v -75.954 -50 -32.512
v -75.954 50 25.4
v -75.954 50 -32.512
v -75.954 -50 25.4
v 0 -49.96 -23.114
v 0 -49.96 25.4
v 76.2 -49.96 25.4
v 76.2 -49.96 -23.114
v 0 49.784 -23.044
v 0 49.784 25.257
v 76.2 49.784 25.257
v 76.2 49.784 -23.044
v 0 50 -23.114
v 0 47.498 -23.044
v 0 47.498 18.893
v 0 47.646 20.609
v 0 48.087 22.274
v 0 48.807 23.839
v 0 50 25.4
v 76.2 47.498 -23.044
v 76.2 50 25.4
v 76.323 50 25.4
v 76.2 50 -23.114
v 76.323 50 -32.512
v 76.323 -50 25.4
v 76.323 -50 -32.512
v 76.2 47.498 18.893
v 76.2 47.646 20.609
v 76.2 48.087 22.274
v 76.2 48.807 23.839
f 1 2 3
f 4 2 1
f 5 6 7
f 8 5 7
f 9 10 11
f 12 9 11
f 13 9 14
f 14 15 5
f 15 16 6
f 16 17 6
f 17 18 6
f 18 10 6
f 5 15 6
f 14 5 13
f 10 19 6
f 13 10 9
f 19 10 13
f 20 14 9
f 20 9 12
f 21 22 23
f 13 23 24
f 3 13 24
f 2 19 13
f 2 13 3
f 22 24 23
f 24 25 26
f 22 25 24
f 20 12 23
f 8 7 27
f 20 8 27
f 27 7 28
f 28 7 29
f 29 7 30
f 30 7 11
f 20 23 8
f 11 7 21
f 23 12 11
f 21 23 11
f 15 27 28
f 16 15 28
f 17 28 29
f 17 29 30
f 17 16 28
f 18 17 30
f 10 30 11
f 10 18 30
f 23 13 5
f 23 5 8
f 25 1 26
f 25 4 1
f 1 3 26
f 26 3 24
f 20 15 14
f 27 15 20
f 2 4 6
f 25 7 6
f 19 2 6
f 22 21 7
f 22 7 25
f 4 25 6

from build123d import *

# Parameters (mm, degrees)
F1_DEPTH      = 25.4
F1_DEPTH_BACK = 32.512
F3_DEPTH      = 39.37
F3_DEPTH_BACK = 23.114
F6_START      = -47.498
F5_W          = 76.2000009418
F5_H          = 48.3009684831
F6_DEPTH      = 2.286
F7_T1_DEPTH   = 76.1999934912


# Not quite as in the source:
# - a fillet or chamfer that OpenCascade refuses, or shapes differently, is made with other operations: its cross-section is extruded or revolved along the edge and cut away or added


with BuildPart() as f1:
    # F0 (on Top) → F1 (new body, two sides)
    with BuildSketch(Plane.XY) as f1_sk:
        Polygon((0, 0), (0, -50), (76.3228982687, -50), (76.3228982687, 50), (0, 50), align=None)
        Polygon((-75.9541913867, -50), (0, -50), (0, 0), (0, 50), (-75.9541913867, 50), align=None)
    extrude(amount=F1_DEPTH)
    extrude(f1_sk.sketch, amount=-F1_DEPTH_BACK)


with BuildPart() as f3:
    # F2 (on Top) → F3 (new body, two sides)
    with BuildSketch(Plane.XY) as f3_sk:
        Polygon((0, 50.1445159316), (0, 0), (0, -49.9601624906), (76.1999934912, -49.9601624906), (76.1999934912, 50.1445159316), align=None)
    extrude(amount=F3_DEPTH)
    extrude(f3_sk.sketch, amount=-F3_DEPTH_BACK)


with BuildPart() as f1_1:
    add(f1.part)

    # F4: cut F3
    add(f3.part, mode=Mode.SUBTRACT)

    # F5 (on Front) → F6 (join)
    with BuildSketch(Plane.XZ.offset(F6_START)):
        with Locations((38.1000004709, 1.1061290279)):
            Rectangle(F5_W, F5_H)
    extrude(amount=-F6_DEPTH)

    # F7: fillet of radius 10 on 1 edges, made by hand

    # F7_s2 → F7_t1 (cut)
    with BuildSketch(Plane.YZ):
        with BuildLine():
            ThreePointArc((47.498, 18.8931076318), (48.0868364163, 22.2739359327), (49.784, 25.2566132694))
            Line((49.784, 25.2566132694), (47.498, 25.2566132694))
            Line((47.498, 25.2566132694), (47.498, 18.8931076318))
        make_face()
    extrude(amount=F7_T1_DEPTH, mode=Mode.SUBTRACT)


solid = f1_1.part
